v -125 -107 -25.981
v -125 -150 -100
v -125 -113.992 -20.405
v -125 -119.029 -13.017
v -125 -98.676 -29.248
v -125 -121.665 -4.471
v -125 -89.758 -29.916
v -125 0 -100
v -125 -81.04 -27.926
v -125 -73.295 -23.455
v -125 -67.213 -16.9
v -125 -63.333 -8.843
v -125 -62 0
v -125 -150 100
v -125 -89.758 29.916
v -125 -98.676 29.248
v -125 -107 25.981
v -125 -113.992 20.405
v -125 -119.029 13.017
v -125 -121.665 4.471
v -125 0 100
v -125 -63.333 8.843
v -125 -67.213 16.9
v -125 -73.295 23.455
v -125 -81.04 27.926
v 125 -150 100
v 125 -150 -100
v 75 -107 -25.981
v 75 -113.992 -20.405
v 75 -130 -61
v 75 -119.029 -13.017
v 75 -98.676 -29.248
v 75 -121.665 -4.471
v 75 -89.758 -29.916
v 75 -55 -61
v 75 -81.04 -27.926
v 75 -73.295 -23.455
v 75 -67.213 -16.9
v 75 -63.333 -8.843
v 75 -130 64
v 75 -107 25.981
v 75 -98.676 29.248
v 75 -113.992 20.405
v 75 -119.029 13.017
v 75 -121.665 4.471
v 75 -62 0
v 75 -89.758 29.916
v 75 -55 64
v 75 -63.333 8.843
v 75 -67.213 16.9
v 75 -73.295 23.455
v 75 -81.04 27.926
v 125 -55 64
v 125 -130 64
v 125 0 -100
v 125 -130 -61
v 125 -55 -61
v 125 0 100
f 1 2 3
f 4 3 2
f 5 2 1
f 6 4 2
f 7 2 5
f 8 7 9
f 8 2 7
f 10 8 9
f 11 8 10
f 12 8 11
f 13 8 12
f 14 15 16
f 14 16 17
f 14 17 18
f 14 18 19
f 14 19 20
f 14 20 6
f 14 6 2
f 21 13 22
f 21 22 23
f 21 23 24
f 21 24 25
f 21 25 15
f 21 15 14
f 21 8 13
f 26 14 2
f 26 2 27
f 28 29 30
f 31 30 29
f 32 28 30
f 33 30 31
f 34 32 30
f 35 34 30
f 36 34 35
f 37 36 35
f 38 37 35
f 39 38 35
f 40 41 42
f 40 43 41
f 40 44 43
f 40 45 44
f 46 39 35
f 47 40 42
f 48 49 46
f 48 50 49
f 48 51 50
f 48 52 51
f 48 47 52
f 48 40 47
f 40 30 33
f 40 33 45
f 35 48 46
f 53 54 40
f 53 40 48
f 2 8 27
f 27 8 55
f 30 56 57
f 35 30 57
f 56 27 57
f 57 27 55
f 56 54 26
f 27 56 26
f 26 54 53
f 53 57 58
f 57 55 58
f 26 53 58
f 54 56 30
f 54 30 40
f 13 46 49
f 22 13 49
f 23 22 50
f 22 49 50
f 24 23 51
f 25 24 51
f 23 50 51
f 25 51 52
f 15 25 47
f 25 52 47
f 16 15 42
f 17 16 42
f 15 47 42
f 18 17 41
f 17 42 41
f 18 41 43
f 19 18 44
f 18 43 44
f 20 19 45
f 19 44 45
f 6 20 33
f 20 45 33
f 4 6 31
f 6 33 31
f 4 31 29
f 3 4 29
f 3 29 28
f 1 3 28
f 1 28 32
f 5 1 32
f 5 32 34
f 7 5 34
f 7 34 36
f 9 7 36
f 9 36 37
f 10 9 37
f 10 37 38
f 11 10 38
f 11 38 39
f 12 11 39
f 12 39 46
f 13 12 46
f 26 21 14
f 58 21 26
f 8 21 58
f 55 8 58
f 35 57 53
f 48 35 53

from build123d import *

# Parameters (mm, degrees)
F0_W      = 127.6799589396
F0_H      = 51.2897223234
F1_DEPTH  = 114.3676936626
F2_W      = 115.8702634275
F2_H      = 50.820171833
F3_DEPTH  = 25
F4_DEPTH  = 30
F7_W      = 250
F7_H      = 200
F8_DEPTH  = 150
F9_W      = 75
F9_H      = 125
F10_DEPTH = 50
F11_R     = 30
F12_DEPTH = 200.001


with BuildPart() as f1:
    # F0 (on Front) → F1 (new body)
    with BuildSketch(Plane.XZ):
        with Locations((63.8399794698, -56.7509904504)):
            Rectangle(F0_W, F0_H)
    extrude(amount=F1_DEPTH)


with BuildPart() as f3:
    # F2 (on Front) → F3 (new body)
    with BuildSketch(Plane.XZ):
        with Locations((103.8953531533, 116.1821186543)):
            Rectangle(F2_W, F2_H)
    extrude(amount=F3_DEPTH)

    # F4 (add): a face of the model
    f4_faces = [f3.faces().sort_by_distance(p)[0] for p in [
        (103.8953531533, -25, 116.1821186543),
    ]]
    extrude(f4_faces, amount=F4_DEPTH)


with BuildPart() as f8:
    # F7 (on Front) → F8 (new body)
    with BuildSketch(Plane.XZ):
        Rectangle(F7_W, F7_H)
    extrude(amount=F8_DEPTH)

    # F9 (on face) → F10 (cut)
    with BuildSketch(Plane.YZ.offset(125)):
        with Locations((-92.5, 1.5)):
            Rectangle(F9_W, F9_H)
    extrude(amount=-F10_DEPTH, mode=Mode.SUBTRACT)

    # F11 (on face) → F12 (cut, through all)
    with BuildSketch(Plane.YZ.offset(75)):
        with Locations((-92, 0)):
            Circle(F11_R)
    extrude(amount=-F12_DEPTH, mode=Mode.SUBTRACT)


solid = f8.part
